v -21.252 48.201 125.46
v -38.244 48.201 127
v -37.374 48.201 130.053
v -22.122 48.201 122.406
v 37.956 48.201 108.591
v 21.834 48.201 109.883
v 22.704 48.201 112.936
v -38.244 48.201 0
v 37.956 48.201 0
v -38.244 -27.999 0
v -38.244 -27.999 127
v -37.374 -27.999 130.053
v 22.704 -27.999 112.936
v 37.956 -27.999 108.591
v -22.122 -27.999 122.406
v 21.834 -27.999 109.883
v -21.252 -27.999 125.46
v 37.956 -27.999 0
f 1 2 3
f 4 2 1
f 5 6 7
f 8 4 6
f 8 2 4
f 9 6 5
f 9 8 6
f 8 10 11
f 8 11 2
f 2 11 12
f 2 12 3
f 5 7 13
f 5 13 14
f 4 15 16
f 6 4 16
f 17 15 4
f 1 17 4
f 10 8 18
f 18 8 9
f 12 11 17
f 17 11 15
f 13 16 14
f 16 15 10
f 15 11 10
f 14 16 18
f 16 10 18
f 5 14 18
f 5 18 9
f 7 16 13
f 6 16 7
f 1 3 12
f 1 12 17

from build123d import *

# Parameters (mm, degrees)
F0_W     = 76.2
F0_H     = 76.2
F1_DEPTH = 127
F3_DEPTH = 76.201
F4_W     = 16.764
F4_H     = 76.2
F5_DEPTH = 3.175
F7_DEPTH = 76.201


with BuildPart() as f1:
    # F0 (on Top) → F1 (new body)
    with BuildSketch(Plane.XY):
        with Locations((-0.143903846, 10.1010264666)):
            Rectangle(F0_W, F0_H)
    extrude(amount=F1_DEPTH)

    # F2 (on face) → F3 (cut, through all)
    with BuildSketch(Plane.XZ.offset(27.9989735334)):
        Polygon((37.956096154, 127), (-38.243903846, 127), (37.956096154, 105.2891537547), align=None)
    extrude(amount=-F3_DEPTH, mode=Mode.SUBTRACT)

    # F4 (on face) → F5 (join)
    with BuildSketch(Plane(origin=(30.5963615899, 0, 107.3860837485), x_dir=(0.9617256613, 0, -0.2740141465), z_dir=(0.2740141465, 0, 0.9617256613))):
        with Locations((-63.1979403185, 10.1010264666)):
            Rectangle(F4_W, F4_H)
        with Locations((-0.7293659272, 10.1010264666)):
            Rectangle(F4_W, F4_H)
    extrude(amount=F5_DEPTH)

    # F6 (on face) → F7 (cut, through all)
    with BuildSketch(Plane.XZ.offset(27.9989735334)):
        Polygon((37.956096154, 108.590511021), (37.956096154, 105.2891537547), (38.826091069, 108.3426327292), align=None)
    extrude(amount=-F7_DEPTH, mode=Mode.SUBTRACT)


solid = f1.part
